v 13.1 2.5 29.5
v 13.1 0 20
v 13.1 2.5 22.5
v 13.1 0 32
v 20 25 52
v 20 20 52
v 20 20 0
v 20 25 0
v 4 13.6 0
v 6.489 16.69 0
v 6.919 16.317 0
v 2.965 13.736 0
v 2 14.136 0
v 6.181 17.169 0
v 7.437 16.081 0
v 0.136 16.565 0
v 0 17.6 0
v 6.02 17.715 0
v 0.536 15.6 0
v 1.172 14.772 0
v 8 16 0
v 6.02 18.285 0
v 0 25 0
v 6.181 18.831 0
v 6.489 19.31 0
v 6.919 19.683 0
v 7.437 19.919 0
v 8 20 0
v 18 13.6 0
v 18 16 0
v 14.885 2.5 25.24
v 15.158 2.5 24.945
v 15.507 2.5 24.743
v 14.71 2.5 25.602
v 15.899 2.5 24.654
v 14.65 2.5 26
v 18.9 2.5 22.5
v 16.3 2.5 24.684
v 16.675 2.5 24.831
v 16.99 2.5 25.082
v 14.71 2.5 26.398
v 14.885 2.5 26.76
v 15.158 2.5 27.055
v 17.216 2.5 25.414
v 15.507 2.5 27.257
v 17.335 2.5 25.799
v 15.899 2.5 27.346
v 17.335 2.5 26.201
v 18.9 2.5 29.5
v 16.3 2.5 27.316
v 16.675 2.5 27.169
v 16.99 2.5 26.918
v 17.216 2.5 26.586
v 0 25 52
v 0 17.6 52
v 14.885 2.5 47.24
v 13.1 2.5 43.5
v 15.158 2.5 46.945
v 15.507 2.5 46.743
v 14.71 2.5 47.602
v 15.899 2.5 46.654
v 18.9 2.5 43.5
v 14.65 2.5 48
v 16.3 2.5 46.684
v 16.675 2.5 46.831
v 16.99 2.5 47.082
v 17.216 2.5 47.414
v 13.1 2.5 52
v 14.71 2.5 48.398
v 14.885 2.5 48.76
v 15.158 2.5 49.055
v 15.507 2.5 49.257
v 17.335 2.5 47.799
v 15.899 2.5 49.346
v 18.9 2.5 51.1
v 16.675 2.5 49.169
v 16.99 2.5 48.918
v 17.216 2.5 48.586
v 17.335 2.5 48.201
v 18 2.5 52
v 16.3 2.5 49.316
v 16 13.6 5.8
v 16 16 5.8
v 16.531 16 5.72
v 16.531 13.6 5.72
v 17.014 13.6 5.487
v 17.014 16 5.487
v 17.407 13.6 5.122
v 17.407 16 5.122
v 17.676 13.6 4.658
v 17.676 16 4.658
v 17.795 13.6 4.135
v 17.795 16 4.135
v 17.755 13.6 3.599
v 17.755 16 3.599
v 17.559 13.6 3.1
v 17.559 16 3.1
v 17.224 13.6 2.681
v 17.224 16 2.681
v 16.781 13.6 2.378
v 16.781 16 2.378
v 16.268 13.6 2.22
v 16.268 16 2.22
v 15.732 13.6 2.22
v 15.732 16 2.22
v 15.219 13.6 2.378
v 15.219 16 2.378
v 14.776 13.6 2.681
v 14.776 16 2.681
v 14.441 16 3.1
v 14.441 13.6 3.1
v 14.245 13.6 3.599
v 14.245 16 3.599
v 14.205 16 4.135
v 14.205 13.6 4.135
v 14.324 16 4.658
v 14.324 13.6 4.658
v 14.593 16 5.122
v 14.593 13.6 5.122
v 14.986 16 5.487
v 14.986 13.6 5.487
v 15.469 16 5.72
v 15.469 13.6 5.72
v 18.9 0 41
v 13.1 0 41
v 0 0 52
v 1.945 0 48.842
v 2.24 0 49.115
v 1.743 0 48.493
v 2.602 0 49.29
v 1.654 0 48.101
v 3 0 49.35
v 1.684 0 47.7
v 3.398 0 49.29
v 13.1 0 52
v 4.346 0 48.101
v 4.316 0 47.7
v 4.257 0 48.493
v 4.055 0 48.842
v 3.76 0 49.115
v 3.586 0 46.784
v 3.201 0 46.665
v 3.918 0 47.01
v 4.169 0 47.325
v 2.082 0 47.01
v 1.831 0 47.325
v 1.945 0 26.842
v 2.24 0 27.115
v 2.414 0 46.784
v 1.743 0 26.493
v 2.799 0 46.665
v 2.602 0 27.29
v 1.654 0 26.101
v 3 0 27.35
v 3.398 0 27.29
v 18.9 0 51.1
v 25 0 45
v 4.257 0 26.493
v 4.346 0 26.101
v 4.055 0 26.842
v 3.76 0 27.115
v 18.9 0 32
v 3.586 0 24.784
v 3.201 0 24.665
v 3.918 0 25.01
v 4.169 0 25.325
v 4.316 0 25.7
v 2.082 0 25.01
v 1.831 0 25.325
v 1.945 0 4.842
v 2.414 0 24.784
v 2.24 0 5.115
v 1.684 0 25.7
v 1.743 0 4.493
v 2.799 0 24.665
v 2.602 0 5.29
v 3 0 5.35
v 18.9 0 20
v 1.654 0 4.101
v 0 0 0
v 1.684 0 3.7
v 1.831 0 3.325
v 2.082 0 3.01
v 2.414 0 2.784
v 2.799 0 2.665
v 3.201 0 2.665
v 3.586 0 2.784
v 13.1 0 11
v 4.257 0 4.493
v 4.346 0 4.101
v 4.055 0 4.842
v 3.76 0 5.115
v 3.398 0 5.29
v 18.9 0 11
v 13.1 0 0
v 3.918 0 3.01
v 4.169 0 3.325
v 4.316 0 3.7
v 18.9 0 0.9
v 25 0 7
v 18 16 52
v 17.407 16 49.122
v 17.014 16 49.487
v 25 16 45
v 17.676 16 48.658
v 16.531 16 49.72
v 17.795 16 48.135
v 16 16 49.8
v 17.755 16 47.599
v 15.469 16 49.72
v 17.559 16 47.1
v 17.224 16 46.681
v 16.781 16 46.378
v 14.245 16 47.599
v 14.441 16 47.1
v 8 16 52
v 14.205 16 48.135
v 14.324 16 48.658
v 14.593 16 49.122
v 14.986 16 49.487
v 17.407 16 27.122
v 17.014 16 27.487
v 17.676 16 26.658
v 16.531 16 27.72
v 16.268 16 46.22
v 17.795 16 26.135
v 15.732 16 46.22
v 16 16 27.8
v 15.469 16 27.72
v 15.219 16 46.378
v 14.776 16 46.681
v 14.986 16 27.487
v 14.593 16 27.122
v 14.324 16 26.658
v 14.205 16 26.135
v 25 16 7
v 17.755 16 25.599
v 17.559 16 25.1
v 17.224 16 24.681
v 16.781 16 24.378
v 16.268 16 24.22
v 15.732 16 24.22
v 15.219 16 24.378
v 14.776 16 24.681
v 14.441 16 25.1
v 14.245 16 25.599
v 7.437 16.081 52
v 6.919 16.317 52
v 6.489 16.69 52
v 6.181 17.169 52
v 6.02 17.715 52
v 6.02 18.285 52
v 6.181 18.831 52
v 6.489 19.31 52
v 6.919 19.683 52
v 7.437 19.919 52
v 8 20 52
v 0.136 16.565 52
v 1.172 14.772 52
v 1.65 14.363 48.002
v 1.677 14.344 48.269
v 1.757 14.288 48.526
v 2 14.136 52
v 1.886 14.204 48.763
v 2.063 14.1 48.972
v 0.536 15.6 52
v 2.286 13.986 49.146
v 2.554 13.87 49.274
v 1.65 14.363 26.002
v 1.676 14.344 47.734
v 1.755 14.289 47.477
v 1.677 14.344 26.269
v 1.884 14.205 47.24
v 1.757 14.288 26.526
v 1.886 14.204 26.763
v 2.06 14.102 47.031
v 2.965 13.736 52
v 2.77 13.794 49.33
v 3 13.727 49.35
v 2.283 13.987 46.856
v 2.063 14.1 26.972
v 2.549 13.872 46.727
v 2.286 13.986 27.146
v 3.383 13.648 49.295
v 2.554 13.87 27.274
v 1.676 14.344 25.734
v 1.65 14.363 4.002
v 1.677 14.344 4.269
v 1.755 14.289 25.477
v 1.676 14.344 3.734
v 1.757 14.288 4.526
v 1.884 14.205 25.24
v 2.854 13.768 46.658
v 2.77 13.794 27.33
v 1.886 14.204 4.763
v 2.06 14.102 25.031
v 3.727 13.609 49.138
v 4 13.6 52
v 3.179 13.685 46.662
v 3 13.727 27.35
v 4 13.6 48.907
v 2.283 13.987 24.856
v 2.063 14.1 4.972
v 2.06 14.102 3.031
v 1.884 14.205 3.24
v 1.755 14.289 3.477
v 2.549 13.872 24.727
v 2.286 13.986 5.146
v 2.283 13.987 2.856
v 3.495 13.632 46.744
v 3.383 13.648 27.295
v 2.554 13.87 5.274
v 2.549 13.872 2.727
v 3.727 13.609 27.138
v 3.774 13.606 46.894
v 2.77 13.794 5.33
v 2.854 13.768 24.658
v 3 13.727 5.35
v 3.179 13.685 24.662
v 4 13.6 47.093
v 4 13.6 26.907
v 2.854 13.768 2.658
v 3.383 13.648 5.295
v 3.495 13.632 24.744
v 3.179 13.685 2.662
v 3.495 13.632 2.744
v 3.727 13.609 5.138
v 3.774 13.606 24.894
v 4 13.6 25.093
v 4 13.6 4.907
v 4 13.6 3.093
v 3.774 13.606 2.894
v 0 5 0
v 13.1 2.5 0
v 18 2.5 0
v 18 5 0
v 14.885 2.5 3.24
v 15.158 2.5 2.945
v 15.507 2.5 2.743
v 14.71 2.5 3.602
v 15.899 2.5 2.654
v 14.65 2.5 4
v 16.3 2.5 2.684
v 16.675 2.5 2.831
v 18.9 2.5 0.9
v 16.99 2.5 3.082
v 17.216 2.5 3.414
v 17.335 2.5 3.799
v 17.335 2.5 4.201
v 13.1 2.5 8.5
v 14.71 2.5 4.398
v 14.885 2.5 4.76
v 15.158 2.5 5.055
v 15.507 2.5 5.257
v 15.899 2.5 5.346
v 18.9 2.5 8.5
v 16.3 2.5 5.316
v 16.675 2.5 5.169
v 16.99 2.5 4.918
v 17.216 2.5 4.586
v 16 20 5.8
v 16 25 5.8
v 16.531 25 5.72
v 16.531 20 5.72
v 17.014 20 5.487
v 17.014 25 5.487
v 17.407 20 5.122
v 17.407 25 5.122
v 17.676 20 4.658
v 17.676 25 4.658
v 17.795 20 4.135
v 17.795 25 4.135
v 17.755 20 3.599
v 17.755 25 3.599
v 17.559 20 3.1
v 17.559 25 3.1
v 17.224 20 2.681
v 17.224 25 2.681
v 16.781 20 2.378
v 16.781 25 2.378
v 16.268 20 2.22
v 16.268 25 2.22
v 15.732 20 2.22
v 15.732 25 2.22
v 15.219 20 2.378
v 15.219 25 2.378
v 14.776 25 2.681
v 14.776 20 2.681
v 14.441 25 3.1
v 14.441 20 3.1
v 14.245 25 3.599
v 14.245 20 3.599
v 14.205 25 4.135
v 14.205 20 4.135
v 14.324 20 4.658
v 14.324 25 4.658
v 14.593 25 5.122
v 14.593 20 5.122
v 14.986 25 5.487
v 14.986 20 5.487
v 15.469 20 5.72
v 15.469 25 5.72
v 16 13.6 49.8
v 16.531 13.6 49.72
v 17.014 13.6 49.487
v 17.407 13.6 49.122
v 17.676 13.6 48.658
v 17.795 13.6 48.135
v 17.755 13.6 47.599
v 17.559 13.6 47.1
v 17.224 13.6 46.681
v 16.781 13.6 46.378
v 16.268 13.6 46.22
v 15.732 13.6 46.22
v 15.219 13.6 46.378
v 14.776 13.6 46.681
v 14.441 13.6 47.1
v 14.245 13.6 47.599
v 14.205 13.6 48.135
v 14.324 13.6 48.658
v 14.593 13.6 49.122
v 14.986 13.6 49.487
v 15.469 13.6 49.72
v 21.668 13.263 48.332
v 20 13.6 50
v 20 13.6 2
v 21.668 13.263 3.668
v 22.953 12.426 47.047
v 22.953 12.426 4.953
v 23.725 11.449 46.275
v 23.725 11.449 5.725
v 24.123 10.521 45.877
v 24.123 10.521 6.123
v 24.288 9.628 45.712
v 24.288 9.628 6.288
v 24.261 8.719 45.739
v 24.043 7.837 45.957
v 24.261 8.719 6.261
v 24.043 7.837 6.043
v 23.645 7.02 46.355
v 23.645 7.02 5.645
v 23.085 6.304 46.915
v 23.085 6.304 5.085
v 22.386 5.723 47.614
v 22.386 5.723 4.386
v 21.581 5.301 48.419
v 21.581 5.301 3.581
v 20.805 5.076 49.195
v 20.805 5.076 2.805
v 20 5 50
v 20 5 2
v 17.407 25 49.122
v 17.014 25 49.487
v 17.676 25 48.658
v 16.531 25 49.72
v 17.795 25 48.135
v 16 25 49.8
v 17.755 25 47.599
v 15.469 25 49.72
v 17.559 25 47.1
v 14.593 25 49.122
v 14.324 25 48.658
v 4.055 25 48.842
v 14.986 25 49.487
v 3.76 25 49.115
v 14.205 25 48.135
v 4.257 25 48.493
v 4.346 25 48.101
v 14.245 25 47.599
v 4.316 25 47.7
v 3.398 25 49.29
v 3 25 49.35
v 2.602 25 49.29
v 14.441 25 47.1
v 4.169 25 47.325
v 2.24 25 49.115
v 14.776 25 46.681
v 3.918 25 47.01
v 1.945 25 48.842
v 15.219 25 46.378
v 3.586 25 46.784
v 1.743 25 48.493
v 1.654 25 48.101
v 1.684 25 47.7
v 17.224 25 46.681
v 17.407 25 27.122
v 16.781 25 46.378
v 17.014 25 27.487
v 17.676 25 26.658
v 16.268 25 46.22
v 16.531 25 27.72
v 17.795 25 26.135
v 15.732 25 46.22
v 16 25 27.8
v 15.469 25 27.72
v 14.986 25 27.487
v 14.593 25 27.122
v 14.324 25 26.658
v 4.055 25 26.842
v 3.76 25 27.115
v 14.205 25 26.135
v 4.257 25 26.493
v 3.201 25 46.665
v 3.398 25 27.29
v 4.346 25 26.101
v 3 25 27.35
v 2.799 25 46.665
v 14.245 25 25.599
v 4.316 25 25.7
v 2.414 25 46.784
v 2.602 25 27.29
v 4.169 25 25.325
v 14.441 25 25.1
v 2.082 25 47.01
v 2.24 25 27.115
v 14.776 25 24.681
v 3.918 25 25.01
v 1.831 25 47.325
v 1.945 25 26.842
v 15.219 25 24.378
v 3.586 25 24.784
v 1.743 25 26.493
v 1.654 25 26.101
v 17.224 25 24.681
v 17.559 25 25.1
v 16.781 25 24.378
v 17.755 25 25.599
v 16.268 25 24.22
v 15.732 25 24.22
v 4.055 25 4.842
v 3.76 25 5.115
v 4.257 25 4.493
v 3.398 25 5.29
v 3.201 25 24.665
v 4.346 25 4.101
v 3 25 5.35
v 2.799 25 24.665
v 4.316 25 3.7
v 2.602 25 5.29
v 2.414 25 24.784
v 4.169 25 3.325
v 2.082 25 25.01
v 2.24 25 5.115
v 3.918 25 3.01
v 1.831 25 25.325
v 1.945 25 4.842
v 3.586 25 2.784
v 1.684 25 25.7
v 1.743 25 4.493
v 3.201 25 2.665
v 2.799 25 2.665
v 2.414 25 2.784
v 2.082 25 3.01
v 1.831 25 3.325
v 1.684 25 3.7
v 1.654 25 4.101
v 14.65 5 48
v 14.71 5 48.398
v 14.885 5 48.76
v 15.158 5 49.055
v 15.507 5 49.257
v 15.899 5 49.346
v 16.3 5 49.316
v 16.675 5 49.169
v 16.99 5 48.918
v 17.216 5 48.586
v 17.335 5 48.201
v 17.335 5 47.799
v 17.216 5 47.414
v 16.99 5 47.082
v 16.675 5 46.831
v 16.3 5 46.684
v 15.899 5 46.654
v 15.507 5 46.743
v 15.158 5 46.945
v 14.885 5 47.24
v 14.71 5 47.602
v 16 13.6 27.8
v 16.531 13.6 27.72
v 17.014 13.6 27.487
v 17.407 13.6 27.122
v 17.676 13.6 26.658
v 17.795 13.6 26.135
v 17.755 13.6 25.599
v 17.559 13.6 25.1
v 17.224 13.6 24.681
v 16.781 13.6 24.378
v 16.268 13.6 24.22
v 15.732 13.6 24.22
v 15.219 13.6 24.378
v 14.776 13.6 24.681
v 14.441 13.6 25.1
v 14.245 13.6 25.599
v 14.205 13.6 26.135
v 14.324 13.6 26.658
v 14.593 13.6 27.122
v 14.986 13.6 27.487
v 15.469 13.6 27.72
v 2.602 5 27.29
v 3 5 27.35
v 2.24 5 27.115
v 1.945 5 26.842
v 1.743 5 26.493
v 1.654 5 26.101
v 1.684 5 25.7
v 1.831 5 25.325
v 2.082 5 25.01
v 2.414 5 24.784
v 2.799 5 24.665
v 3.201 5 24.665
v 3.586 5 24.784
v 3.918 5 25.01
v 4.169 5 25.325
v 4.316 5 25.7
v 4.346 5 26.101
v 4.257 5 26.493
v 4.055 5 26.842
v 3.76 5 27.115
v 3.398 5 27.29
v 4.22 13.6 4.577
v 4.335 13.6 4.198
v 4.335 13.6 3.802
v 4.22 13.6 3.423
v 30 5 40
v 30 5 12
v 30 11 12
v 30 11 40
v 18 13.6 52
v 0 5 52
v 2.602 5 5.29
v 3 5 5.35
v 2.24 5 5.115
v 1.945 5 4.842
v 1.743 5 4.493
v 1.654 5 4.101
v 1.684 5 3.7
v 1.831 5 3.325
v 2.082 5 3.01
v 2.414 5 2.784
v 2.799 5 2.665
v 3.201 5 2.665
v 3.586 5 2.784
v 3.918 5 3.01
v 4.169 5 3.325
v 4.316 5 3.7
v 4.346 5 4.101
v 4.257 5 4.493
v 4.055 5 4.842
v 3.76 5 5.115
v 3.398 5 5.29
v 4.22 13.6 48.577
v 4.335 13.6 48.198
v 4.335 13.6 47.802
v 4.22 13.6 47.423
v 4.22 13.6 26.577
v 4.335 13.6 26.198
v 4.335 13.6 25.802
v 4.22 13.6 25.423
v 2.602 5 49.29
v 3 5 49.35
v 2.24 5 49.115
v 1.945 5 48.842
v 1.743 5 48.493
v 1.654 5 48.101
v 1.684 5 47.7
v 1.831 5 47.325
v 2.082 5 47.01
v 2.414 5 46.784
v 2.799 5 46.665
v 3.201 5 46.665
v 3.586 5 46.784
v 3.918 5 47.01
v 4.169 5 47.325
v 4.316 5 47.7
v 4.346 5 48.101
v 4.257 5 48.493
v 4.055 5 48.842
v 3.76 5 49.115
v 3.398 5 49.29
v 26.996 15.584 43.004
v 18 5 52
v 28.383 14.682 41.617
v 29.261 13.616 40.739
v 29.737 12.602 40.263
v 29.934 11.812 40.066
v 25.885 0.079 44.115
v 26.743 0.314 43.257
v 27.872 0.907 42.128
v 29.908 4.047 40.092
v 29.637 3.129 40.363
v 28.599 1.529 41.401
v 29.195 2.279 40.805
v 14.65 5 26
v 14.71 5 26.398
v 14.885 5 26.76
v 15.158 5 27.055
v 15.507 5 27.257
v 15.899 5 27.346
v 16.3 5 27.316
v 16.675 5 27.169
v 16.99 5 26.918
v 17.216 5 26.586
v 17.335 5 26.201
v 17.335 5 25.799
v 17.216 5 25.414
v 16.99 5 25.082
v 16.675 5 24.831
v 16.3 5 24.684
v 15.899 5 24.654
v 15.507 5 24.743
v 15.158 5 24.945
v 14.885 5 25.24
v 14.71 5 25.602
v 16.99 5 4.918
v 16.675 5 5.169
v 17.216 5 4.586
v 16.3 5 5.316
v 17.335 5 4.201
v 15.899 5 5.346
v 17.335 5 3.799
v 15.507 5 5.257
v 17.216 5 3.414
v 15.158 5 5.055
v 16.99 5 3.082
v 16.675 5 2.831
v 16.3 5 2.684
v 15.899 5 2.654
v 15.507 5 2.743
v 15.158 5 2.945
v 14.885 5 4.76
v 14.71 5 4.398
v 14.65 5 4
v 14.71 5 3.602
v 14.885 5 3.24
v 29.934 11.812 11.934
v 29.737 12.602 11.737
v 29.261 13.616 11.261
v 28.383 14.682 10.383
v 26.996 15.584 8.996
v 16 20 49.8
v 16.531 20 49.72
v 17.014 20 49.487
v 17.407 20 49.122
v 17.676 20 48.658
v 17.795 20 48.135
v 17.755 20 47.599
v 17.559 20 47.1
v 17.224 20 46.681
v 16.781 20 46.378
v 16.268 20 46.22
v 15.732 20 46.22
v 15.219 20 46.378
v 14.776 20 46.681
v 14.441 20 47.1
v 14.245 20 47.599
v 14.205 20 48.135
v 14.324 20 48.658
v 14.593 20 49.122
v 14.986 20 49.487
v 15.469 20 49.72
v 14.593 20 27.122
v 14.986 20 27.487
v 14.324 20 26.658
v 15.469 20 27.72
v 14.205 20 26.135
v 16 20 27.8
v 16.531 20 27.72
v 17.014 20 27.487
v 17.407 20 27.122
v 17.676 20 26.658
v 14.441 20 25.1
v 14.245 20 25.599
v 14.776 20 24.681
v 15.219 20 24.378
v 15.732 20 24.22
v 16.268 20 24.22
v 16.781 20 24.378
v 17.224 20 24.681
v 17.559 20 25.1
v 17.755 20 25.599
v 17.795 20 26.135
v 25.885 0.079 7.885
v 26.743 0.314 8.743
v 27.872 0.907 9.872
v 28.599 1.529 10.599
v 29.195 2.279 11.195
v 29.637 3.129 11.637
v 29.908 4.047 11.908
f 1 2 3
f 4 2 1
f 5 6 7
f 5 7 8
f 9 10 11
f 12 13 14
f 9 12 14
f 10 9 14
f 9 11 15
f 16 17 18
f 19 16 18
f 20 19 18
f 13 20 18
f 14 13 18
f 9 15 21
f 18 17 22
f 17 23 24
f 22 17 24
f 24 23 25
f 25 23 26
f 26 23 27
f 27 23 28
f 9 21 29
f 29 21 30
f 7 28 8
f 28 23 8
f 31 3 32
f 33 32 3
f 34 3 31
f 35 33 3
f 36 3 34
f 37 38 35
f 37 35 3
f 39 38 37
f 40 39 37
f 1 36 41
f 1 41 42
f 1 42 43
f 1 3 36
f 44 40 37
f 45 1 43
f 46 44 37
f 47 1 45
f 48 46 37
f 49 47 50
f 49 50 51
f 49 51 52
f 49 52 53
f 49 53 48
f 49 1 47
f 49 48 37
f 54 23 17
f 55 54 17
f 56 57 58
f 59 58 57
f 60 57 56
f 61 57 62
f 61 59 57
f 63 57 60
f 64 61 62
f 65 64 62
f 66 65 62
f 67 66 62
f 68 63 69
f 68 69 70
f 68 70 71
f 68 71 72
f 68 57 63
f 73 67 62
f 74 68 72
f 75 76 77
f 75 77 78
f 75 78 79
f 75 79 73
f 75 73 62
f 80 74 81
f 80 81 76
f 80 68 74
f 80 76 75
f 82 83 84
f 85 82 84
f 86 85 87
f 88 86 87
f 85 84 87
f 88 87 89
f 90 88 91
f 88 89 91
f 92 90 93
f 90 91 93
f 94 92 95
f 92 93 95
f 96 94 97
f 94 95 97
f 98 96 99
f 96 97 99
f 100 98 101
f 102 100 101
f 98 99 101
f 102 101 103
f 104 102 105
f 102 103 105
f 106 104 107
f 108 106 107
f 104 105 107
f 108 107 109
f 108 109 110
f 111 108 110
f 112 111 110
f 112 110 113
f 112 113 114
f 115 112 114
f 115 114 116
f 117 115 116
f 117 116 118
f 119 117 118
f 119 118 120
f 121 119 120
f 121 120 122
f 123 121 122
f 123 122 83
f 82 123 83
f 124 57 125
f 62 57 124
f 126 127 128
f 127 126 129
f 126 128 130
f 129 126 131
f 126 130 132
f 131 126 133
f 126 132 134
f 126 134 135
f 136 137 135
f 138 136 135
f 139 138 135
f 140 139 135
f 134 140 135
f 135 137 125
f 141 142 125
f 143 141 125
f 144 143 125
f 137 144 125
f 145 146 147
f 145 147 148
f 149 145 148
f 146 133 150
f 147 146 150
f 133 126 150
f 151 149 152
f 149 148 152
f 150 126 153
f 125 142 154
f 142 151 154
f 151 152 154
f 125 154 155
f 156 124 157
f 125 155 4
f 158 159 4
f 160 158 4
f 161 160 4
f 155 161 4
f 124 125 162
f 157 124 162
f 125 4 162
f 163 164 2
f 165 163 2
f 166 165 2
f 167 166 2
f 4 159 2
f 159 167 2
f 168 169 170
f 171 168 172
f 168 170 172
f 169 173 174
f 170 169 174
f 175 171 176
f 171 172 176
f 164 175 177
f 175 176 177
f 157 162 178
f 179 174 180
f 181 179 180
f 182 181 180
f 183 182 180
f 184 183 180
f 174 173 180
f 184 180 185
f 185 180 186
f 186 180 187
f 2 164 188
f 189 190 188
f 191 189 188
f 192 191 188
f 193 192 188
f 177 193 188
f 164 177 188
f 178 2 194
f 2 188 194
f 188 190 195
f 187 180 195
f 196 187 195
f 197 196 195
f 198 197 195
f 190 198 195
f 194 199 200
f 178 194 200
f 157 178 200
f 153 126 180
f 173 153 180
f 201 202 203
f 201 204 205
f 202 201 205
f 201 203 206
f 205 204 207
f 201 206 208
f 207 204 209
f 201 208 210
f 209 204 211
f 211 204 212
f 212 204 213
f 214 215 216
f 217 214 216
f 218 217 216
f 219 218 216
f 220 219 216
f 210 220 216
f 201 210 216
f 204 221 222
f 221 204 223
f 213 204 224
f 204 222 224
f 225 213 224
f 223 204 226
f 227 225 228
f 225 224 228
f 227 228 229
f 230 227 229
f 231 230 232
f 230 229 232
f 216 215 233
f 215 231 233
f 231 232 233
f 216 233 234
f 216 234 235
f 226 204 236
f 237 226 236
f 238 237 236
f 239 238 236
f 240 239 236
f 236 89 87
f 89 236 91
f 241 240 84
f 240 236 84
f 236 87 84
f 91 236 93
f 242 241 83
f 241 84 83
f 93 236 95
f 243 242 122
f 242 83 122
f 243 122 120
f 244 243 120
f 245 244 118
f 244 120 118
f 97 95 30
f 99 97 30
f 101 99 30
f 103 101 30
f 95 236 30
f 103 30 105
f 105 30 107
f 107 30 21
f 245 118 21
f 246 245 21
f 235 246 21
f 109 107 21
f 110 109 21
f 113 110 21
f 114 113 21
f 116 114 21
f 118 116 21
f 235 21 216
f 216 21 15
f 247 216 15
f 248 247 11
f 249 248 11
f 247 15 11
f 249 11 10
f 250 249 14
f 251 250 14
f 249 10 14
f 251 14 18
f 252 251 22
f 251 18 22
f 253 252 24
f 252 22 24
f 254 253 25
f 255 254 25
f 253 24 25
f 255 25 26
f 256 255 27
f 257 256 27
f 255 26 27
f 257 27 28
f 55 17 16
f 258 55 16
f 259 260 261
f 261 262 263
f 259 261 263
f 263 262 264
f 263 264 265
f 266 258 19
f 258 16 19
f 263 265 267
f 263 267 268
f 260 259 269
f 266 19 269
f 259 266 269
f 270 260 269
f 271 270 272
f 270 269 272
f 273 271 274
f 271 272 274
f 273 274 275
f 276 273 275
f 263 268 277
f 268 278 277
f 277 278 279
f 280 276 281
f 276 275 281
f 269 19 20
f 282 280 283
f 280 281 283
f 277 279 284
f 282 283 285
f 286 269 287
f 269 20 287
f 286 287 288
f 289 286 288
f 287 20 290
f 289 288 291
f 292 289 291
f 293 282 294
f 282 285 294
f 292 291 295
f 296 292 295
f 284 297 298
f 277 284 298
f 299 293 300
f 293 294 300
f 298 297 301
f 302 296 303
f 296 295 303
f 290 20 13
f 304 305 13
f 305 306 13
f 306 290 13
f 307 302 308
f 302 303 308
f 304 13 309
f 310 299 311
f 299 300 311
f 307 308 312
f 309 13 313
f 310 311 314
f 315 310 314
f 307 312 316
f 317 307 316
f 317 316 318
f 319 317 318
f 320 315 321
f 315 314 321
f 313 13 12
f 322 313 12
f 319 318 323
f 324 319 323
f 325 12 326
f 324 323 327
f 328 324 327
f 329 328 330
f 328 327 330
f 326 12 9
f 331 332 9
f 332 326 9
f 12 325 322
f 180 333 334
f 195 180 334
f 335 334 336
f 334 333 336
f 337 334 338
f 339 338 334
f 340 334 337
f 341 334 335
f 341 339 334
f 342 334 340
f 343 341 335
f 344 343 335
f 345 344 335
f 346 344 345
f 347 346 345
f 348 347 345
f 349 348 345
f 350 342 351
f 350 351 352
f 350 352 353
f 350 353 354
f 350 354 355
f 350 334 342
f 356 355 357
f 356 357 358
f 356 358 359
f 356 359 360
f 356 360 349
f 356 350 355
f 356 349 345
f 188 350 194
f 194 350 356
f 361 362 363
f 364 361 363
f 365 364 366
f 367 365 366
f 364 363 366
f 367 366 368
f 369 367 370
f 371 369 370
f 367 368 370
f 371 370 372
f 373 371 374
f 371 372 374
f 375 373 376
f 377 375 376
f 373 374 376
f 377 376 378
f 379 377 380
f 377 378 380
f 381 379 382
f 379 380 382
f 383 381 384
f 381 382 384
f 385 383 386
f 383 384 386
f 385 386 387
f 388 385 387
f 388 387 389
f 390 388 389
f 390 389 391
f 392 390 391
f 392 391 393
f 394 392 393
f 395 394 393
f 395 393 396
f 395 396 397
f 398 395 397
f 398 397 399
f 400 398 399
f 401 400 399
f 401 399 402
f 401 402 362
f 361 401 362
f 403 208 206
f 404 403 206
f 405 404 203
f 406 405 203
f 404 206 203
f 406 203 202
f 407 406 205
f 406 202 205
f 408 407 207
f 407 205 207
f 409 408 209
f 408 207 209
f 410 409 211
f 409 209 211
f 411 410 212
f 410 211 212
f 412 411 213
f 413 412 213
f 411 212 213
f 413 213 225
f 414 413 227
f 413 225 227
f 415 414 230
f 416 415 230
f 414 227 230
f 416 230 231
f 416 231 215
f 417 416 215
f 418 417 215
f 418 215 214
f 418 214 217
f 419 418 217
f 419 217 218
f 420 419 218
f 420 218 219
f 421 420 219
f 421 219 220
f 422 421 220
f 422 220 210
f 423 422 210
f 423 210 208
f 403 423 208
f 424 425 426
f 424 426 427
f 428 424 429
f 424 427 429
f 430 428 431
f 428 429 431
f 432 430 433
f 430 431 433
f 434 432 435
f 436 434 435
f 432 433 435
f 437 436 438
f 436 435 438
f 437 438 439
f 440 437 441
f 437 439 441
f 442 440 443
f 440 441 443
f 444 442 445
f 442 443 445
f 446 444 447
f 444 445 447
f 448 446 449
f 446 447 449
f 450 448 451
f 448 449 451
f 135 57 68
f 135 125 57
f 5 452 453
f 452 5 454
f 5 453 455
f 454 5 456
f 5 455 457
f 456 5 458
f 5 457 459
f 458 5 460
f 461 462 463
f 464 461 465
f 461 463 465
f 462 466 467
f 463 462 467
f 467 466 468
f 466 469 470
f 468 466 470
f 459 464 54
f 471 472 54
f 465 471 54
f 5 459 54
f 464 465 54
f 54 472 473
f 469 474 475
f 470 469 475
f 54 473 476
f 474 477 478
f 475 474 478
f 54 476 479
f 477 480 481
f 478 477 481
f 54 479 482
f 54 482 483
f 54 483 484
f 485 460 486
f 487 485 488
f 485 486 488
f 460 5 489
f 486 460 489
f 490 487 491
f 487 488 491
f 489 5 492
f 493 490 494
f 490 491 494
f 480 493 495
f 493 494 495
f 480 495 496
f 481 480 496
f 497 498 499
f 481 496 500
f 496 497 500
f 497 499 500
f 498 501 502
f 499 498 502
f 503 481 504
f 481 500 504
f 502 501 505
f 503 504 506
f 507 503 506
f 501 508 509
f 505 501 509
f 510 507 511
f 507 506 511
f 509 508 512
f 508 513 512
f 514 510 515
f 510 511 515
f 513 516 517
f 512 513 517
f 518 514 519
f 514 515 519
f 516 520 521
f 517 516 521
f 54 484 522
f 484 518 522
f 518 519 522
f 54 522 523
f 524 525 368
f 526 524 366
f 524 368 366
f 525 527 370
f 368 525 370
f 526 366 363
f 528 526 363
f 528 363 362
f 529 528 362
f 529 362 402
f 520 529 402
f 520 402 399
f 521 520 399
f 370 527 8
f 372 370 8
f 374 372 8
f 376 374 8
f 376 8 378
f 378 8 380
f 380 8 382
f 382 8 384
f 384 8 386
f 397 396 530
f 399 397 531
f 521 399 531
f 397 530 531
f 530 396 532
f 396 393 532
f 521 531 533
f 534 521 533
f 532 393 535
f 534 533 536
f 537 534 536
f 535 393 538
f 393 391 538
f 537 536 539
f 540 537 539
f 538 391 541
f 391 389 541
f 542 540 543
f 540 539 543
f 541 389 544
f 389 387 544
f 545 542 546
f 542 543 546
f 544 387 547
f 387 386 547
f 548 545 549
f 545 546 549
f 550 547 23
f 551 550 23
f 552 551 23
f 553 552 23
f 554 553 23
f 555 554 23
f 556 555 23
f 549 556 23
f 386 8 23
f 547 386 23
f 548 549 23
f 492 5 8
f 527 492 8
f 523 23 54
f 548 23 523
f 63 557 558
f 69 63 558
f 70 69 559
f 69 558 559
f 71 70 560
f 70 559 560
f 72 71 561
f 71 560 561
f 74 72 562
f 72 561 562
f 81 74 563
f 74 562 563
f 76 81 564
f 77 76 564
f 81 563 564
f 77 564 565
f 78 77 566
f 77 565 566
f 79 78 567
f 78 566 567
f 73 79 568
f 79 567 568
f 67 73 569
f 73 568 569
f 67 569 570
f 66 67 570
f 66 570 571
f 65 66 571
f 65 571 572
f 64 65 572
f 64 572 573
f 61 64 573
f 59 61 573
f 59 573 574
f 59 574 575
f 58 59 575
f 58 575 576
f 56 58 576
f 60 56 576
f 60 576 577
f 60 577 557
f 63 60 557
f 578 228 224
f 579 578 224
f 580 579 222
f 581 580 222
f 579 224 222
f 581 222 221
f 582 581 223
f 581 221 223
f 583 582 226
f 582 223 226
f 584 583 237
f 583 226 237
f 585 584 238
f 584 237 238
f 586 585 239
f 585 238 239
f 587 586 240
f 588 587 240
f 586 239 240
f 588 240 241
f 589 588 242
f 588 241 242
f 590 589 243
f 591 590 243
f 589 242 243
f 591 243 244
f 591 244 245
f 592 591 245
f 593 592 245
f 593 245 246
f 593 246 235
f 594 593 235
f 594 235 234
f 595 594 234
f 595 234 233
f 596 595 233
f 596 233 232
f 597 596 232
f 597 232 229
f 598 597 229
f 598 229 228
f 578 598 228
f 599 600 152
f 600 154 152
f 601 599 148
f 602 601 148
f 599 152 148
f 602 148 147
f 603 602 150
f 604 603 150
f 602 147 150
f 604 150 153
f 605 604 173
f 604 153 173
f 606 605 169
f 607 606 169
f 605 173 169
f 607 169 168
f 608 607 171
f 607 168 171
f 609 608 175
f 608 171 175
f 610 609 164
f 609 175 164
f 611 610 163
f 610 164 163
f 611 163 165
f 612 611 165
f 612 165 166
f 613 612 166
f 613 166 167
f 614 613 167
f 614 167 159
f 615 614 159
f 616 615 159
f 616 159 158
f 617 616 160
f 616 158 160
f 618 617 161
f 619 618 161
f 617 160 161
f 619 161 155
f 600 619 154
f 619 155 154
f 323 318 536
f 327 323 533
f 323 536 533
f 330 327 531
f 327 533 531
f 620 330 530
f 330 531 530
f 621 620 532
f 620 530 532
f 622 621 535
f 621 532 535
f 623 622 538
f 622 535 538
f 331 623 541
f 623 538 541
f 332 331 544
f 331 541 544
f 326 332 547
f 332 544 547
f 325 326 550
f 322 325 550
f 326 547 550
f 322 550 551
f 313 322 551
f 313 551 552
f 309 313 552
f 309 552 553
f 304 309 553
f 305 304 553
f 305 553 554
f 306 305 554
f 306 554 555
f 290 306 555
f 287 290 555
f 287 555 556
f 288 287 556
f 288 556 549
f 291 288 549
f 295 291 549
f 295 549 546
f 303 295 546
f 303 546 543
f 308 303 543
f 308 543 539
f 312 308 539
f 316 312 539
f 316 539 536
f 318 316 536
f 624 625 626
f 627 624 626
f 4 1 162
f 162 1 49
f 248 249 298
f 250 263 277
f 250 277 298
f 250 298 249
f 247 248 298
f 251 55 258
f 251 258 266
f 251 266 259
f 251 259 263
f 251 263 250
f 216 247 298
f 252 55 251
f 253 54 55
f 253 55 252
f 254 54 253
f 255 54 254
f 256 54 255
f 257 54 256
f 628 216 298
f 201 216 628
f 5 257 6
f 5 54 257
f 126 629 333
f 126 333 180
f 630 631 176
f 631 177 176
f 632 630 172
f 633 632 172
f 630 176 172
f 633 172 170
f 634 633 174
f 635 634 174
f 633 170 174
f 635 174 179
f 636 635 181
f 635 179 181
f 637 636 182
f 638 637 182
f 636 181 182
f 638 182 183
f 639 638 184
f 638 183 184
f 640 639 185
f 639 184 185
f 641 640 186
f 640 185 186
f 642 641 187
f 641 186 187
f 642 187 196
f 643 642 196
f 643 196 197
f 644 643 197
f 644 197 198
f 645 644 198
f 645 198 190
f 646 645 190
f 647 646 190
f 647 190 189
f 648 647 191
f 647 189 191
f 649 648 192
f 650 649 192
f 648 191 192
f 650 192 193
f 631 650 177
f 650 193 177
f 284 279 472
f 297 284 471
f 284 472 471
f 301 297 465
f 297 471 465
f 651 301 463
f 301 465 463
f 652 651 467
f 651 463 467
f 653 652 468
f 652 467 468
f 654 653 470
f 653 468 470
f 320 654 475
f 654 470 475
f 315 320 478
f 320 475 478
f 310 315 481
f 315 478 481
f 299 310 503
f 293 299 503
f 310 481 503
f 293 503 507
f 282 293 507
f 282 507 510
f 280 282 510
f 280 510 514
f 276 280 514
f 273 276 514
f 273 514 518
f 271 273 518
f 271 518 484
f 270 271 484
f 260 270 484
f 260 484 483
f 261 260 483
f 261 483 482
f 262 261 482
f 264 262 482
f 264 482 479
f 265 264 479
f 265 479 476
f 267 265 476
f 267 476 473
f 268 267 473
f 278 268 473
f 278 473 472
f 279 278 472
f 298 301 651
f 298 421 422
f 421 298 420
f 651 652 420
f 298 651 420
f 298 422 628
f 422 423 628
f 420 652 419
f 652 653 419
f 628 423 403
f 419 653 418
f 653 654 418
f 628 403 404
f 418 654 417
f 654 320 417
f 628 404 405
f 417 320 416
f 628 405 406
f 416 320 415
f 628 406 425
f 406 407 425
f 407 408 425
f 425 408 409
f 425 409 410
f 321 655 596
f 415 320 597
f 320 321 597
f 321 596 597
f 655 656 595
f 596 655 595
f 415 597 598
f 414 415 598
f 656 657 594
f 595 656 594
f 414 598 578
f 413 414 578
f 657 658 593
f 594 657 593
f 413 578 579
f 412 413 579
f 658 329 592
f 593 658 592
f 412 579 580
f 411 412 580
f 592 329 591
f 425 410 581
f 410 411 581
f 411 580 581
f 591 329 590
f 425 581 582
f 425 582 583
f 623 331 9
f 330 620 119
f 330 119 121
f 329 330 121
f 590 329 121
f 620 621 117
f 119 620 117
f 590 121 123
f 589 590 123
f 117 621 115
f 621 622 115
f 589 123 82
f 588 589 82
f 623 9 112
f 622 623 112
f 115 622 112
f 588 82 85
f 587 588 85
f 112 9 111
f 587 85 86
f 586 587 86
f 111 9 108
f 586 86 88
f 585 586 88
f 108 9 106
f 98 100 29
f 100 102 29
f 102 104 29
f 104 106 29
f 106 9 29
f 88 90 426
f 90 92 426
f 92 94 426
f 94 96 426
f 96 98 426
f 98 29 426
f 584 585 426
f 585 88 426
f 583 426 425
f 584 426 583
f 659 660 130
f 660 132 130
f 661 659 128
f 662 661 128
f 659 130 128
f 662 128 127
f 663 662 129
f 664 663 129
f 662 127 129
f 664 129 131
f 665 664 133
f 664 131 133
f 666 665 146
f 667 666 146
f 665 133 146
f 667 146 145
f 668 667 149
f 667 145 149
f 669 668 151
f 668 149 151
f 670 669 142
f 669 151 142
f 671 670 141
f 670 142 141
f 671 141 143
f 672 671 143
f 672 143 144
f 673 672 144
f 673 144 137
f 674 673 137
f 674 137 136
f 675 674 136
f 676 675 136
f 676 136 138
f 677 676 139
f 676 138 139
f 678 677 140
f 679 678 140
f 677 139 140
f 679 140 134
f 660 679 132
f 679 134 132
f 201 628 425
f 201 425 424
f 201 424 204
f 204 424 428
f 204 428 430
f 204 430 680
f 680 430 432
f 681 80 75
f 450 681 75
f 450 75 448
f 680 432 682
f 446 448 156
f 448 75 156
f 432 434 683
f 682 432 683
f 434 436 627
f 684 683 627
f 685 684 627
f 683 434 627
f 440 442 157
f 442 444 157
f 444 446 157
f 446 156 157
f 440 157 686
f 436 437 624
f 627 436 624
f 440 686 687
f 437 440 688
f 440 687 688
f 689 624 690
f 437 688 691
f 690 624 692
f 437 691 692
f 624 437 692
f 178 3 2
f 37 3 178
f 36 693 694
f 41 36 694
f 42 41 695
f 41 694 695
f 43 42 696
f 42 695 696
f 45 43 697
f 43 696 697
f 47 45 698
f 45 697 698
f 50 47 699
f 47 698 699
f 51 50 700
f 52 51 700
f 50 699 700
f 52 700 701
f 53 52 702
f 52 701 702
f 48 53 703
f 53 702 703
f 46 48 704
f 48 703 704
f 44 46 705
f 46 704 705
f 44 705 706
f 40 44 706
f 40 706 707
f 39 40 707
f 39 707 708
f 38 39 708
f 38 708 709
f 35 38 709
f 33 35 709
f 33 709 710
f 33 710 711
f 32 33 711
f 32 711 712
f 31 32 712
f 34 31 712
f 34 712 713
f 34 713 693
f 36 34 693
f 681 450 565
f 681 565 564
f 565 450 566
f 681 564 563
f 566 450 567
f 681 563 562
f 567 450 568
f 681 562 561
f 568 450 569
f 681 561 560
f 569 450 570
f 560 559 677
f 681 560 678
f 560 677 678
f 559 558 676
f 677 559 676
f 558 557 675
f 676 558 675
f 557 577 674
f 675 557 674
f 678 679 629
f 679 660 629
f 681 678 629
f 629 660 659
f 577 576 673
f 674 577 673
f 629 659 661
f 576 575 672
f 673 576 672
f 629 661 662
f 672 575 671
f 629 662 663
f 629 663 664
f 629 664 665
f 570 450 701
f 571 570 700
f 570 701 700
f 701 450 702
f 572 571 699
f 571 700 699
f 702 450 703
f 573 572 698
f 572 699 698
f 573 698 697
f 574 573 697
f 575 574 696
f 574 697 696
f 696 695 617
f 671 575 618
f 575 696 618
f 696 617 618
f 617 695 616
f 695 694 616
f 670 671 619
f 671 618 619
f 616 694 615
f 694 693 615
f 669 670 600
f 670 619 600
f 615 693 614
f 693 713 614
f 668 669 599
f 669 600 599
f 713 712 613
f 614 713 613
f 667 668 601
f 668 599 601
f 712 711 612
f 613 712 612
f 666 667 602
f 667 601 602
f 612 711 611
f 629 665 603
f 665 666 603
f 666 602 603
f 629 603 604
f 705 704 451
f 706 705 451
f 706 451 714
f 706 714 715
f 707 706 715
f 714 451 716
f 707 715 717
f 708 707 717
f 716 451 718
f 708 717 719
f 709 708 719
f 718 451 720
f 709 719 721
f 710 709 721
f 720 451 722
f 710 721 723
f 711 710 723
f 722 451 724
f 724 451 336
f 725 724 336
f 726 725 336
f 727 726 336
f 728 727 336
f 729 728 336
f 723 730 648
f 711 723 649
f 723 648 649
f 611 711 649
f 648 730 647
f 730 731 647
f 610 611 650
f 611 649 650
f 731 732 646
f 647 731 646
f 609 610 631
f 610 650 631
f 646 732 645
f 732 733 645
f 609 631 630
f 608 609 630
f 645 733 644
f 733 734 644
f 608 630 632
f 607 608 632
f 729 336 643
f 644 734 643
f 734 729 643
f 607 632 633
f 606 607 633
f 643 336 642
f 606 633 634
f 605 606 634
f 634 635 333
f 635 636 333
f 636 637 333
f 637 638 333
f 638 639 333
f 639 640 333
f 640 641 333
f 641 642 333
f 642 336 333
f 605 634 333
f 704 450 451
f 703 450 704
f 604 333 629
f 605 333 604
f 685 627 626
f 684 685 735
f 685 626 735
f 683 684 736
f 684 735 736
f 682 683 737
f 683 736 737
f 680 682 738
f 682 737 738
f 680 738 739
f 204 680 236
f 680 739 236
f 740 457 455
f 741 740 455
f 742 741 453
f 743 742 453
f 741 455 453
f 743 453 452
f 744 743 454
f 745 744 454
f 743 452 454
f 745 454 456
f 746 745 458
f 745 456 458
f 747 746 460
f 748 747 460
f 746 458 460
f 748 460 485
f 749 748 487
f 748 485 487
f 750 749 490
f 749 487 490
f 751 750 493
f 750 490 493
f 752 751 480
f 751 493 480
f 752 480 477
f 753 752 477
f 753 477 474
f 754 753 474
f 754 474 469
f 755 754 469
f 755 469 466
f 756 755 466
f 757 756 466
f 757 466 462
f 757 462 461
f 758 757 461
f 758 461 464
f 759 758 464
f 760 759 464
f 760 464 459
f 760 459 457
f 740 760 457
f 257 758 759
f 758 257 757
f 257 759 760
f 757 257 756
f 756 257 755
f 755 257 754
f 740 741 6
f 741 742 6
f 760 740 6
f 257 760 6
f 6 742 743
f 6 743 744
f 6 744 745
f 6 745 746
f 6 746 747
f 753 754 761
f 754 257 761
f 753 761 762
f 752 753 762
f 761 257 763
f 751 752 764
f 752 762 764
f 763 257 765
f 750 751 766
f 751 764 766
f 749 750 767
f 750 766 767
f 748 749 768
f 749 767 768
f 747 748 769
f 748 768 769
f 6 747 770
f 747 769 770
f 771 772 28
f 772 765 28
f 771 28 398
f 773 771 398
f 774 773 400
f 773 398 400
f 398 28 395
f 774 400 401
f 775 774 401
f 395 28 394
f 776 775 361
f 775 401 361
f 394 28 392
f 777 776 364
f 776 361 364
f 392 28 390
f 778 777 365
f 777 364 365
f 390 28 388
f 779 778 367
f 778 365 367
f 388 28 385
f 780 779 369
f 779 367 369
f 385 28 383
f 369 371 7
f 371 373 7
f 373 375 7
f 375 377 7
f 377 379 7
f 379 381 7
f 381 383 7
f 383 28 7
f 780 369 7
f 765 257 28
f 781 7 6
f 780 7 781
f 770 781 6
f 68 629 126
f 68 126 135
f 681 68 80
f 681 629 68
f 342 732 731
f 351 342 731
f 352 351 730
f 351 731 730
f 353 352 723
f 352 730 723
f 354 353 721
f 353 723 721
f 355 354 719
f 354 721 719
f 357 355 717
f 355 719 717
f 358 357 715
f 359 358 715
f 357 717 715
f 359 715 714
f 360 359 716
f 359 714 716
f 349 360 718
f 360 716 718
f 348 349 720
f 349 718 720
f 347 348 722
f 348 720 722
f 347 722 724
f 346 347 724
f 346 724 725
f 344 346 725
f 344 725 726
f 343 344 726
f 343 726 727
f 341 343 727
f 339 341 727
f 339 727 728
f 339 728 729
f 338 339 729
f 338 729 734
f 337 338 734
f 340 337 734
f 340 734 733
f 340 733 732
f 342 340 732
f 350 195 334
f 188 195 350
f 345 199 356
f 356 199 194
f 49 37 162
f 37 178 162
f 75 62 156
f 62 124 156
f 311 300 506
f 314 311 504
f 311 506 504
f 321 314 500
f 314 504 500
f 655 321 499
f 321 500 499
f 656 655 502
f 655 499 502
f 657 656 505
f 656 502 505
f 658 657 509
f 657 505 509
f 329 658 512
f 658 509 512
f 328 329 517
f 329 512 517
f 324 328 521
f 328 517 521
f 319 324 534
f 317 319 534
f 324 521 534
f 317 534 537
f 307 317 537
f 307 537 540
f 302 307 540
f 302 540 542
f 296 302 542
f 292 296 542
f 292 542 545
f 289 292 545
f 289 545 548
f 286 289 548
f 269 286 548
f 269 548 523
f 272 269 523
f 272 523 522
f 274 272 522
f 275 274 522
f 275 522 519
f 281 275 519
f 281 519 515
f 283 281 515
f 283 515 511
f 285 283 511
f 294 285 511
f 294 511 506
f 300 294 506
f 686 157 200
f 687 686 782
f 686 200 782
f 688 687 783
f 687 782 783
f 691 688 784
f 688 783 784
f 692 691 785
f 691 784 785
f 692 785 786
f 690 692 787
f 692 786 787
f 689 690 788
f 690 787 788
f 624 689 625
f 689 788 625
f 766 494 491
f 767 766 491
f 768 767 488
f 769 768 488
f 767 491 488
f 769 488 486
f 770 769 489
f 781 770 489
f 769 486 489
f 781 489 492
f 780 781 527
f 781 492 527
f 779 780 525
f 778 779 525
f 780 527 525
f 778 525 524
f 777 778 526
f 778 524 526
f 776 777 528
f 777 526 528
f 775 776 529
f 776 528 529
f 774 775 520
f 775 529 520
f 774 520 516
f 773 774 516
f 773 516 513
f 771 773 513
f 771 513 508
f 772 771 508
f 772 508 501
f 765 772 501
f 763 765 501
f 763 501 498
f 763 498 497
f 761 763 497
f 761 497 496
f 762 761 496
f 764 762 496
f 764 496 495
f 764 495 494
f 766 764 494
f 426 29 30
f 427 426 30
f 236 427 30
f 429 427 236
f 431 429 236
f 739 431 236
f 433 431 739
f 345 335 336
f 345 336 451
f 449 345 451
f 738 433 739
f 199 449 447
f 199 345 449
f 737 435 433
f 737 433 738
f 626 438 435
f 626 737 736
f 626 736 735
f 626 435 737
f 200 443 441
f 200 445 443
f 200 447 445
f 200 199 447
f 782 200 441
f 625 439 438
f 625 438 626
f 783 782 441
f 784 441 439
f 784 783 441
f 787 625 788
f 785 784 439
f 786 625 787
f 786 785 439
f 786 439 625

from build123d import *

# Parameters (mm, degrees)
BOSS_EXTRUDE1_DEPTH = 52
CUT_EXTRUDE1_REACH  = 67.031
SKETCH2_R           = 1.8
CUT_EXTRUDE3_REACH  = 67.031
SKETCH4_R           = 1.35
CUT_EXTRUDE4_REACH  = 67.031
SKETCH5_R           = 1.35
SKETCH6_R           = 1.35
CUT_EXTRUDE5_DEPTH  = 64.277168192
CHAMFER3_SIZE       = 12
LPATTERN3_COUNT     = 2
LPATTERN3_PITCH     = 22
LPATTERN3_COL_COUNT = 2
LPATTERN3_COL_PITCH = 22
SKETCH7_W           = 5.8
SKETCH7_H           = 12
SKETCH7_H_2         = 12.747013555
SKETCH7_H_3         = 13.058470869
CUT_EXTRUDE6_DEPTH  = 2.5
CHAMFER4_SIZE       = 2.5


# Some blends are built 0.0001 mm under size
with BuildPart() as part:
    # Sketch1 → Boss-Extrude1 (new body)
    with BuildSketch(Plane.XY):
        with BuildLine():
            Line((0, 0), (25, 0))
            ThreePointArc((25, 0), (28.535533906, 1.464466094), (30, 5))
            Line((30, 5), (30, 11))
            ThreePointArc((30, 11), (28.535533906, 14.535533906), (25, 16))
            Line((25, 16), (8, 16))
            ThreePointArc((8, 16), (6, 18), (8, 20))
            Line((8, 20), (20, 20))
            Line((20, 20), (20, 25))
            Line((20, 25), (0, 25))
            Line((0, 25), (0, 17.6))
            ThreePointArc((0, 17.6), (1.171572875, 14.771572875), (4, 13.6))
            Line((4, 13.6), (20, 13.6))
            ThreePointArc((20, 13.6), (24.3, 9.3), (20, 5))
            Line((20, 5), (0, 5))
            Line((0, 5), (0, 0))
        make_face()
    extrude(amount=BOSS_EXTRUDE1_DEPTH)

    # Cut-Extrude1: up to this face of the body (flat: up to its plane)
    cut_extrude1_end = Plane(part.part.faces().sort_by_distance((12, 13.6, 26))[0])
    # Sketch2 → Cut-Extrude1 (cut, up to the picked face)
    with BuildSketch(Plane(origin=(0, 25, 0), x_dir=(1, 0, 0), z_dir=(0, 1, 0)), mode=Mode.PRIVATE) as cut_extrude1_sk1:
        with Locations(Location((16, -26, 0), (0, 0, 270))):
            Circle(SKETCH2_R)
    cut_extrude1_tool1 = split(extrude(cut_extrude1_sk1.sketch, amount=-CUT_EXTRUDE1_REACH, mode=Mode.PRIVATE), bisect_by=cut_extrude1_end, keep=Keep.BOTH, mode=Mode.PRIVATE)
    cut_extrude1 = cut_extrude1_tool1.solids().sort_by(Axis((16, 25, 26), (0, -1, 0)))[0]
    add(cut_extrude1, mode=Mode.SUBTRACT)

    # Sketch4 → Cut-Extrude3 (cut, up to next)
    with BuildSketch(Plane(origin=(0, 25, 0), x_dir=(1, 0, 0), z_dir=(0, 1, 0)), mode=Mode.PRIVATE) as cut_extrude3_sk1:
        with Locations(Location((3, -26, 0), (0, 0, 270))):
            Circle(SKETCH4_R)
    cut_extrude3_tool1 = extrude(cut_extrude3_sk1.sketch, amount=-CUT_EXTRUDE3_REACH, mode=Mode.PRIVATE) & part.part
    cut_extrude3 = cut_extrude3_tool1.solids().sort_by_distance((3, 25, 26))[0]
    add(cut_extrude3, mode=Mode.SUBTRACT)

    # Sketch5 → Cut-Extrude4 (cut, up to next)
    with BuildSketch(Plane.XZ, mode=Mode.PRIVATE) as cut_extrude4_sk1:
        with Locations(Location((3, 26, 0), (0, 0, 90))):
            Circle(SKETCH5_R)
    cut_extrude4_tool1 = extrude(cut_extrude4_sk1.sketch, amount=-CUT_EXTRUDE4_REACH, mode=Mode.PRIVATE) & part.part
    cut_extrude4 = cut_extrude4_tool1.solids().sort_by_distance((3, 0, 26))[0]
    add(cut_extrude4, mode=Mode.SUBTRACT)

    # Sketch6 → Cut-Extrude5 (cut, through all)
    with BuildSketch(Plane(origin=(0, 5, 0), x_dir=(1, 0, 0), z_dir=(0, 1, 0))):
        with Locations(Location((16, -26, 0), (0, 0, 180))):
            Circle(SKETCH6_R)
    cut_extrude5 = extrude(amount=-CUT_EXTRUDE5_DEPTH, mode=Mode.SUBTRACT)

    # Chamfer3
    # the kernel refuses this chamfer: 12 mm, written as the material it takes off along each edge
    with BuildSketch(Plane(origin=(30, -25.860195856, 0), x_dir=(-0.9996219169112969, 0, -0.027495876610586372), z_dir=(0, 1, 0))) as chamfer3_piece_1_section:
        Polygon((CHAMFER3_SIZE * 0.999621916911, CHAMFER3_SIZE * 0.0274958766106), (-CHAMFER3_SIZE * 0.0274958766106, CHAMFER3_SIZE * 0.999621916911), (0, 0), align=None)
    chamfer3_piece_1 = extrude(amount=67.720391711, mode=Mode.PRIVATE)
    chamfer3_piece_1 = split(chamfer3_piece_1, bisect_by=Plane(origin=(19.333333334, 20, 0.666666666), z_dir=(0, -1, 0)), keep=Keep.TOP, mode=Mode.PRIVATE)
    add(chamfer3_piece_1, mode=Mode.SUBTRACT)
    with BuildSketch(Plane(origin=(30, -25.860195856, 52), x_dir=(-0.9996219169112969, 0, 0.027495876610586202), z_dir=(0, 1, 0))) as chamfer3_piece_2_section:
        Polygon((CHAMFER3_SIZE * 0.999621916911, -CHAMFER3_SIZE * 0.0274958766106), (-CHAMFER3_SIZE * 0.0274958766106, -CHAMFER3_SIZE * 0.999621916911), (0, 0), align=None)
    chamfer3_piece_2 = extrude(amount=67.720391711, mode=Mode.PRIVATE)
    chamfer3_piece_2 = split(chamfer3_piece_2, bisect_by=Plane(origin=(19.333333334, 20, 51.333333333), z_dir=(0, -1, 0)), keep=Keep.TOP, mode=Mode.PRIVATE)
    add(chamfer3_piece_2, mode=Mode.SUBTRACT)

    # LPattern3: Cut-Extrude1, Cut-Extrude3, Cut-Extrude4, Cut-Extrude5 ×2
    with Locations(*[(0, 0, i * LPATTERN3_PITCH) for i in range(1, LPATTERN3_COUNT)]):
        add(cut_extrude1, mode=Mode.SUBTRACT)
        add(cut_extrude3, mode=Mode.SUBTRACT)
        add(cut_extrude4, mode=Mode.SUBTRACT)
        add(cut_extrude5, mode=Mode.SUBTRACT)

    # LPattern3 col: Cut-Extrude1, Cut-Extrude3, Cut-Extrude4, Cut-Extrude5 ×2
    with Locations(*[(0, 0, -i * LPATTERN3_COL_PITCH) for i in range(1, LPATTERN3_COL_COUNT)]):
        add(cut_extrude1, mode=Mode.SUBTRACT)
        add(cut_extrude3, mode=Mode.SUBTRACT)
        add(cut_extrude4, mode=Mode.SUBTRACT)
        add(cut_extrude5, mode=Mode.SUBTRACT)

    # Sketch7 → Cut-Extrude6 (cut)
    with BuildSketch(Plane.XZ):
        with Locations((16, 26)):
            Rectangle(SKETCH7_W, SKETCH7_H)
        with Locations((16, 4.626493222)):
            Rectangle(SKETCH7_W, SKETCH7_H_2)
        with Locations((16, 47.529235435)):
            Rectangle(SKETCH7_W, SKETCH7_H_3)
    extrude(amount=-CUT_EXTRUDE6_DEPTH, mode=Mode.SUBTRACT)

    # Chamfer4
    chamfer4_edges = [part.edges().sort_by_distance(p)[0] for p in [
        (16, 2.5, 41),
        (16, 2.5, 20),
        (16, 2.5, 32),
        (16, 2.5, 11),
    ]]
    chamfer(chamfer4_edges, length=CHAMFER4_SIZE - 0.0001)  # a hair under: the kernel refuses the full size


solid = part.part
